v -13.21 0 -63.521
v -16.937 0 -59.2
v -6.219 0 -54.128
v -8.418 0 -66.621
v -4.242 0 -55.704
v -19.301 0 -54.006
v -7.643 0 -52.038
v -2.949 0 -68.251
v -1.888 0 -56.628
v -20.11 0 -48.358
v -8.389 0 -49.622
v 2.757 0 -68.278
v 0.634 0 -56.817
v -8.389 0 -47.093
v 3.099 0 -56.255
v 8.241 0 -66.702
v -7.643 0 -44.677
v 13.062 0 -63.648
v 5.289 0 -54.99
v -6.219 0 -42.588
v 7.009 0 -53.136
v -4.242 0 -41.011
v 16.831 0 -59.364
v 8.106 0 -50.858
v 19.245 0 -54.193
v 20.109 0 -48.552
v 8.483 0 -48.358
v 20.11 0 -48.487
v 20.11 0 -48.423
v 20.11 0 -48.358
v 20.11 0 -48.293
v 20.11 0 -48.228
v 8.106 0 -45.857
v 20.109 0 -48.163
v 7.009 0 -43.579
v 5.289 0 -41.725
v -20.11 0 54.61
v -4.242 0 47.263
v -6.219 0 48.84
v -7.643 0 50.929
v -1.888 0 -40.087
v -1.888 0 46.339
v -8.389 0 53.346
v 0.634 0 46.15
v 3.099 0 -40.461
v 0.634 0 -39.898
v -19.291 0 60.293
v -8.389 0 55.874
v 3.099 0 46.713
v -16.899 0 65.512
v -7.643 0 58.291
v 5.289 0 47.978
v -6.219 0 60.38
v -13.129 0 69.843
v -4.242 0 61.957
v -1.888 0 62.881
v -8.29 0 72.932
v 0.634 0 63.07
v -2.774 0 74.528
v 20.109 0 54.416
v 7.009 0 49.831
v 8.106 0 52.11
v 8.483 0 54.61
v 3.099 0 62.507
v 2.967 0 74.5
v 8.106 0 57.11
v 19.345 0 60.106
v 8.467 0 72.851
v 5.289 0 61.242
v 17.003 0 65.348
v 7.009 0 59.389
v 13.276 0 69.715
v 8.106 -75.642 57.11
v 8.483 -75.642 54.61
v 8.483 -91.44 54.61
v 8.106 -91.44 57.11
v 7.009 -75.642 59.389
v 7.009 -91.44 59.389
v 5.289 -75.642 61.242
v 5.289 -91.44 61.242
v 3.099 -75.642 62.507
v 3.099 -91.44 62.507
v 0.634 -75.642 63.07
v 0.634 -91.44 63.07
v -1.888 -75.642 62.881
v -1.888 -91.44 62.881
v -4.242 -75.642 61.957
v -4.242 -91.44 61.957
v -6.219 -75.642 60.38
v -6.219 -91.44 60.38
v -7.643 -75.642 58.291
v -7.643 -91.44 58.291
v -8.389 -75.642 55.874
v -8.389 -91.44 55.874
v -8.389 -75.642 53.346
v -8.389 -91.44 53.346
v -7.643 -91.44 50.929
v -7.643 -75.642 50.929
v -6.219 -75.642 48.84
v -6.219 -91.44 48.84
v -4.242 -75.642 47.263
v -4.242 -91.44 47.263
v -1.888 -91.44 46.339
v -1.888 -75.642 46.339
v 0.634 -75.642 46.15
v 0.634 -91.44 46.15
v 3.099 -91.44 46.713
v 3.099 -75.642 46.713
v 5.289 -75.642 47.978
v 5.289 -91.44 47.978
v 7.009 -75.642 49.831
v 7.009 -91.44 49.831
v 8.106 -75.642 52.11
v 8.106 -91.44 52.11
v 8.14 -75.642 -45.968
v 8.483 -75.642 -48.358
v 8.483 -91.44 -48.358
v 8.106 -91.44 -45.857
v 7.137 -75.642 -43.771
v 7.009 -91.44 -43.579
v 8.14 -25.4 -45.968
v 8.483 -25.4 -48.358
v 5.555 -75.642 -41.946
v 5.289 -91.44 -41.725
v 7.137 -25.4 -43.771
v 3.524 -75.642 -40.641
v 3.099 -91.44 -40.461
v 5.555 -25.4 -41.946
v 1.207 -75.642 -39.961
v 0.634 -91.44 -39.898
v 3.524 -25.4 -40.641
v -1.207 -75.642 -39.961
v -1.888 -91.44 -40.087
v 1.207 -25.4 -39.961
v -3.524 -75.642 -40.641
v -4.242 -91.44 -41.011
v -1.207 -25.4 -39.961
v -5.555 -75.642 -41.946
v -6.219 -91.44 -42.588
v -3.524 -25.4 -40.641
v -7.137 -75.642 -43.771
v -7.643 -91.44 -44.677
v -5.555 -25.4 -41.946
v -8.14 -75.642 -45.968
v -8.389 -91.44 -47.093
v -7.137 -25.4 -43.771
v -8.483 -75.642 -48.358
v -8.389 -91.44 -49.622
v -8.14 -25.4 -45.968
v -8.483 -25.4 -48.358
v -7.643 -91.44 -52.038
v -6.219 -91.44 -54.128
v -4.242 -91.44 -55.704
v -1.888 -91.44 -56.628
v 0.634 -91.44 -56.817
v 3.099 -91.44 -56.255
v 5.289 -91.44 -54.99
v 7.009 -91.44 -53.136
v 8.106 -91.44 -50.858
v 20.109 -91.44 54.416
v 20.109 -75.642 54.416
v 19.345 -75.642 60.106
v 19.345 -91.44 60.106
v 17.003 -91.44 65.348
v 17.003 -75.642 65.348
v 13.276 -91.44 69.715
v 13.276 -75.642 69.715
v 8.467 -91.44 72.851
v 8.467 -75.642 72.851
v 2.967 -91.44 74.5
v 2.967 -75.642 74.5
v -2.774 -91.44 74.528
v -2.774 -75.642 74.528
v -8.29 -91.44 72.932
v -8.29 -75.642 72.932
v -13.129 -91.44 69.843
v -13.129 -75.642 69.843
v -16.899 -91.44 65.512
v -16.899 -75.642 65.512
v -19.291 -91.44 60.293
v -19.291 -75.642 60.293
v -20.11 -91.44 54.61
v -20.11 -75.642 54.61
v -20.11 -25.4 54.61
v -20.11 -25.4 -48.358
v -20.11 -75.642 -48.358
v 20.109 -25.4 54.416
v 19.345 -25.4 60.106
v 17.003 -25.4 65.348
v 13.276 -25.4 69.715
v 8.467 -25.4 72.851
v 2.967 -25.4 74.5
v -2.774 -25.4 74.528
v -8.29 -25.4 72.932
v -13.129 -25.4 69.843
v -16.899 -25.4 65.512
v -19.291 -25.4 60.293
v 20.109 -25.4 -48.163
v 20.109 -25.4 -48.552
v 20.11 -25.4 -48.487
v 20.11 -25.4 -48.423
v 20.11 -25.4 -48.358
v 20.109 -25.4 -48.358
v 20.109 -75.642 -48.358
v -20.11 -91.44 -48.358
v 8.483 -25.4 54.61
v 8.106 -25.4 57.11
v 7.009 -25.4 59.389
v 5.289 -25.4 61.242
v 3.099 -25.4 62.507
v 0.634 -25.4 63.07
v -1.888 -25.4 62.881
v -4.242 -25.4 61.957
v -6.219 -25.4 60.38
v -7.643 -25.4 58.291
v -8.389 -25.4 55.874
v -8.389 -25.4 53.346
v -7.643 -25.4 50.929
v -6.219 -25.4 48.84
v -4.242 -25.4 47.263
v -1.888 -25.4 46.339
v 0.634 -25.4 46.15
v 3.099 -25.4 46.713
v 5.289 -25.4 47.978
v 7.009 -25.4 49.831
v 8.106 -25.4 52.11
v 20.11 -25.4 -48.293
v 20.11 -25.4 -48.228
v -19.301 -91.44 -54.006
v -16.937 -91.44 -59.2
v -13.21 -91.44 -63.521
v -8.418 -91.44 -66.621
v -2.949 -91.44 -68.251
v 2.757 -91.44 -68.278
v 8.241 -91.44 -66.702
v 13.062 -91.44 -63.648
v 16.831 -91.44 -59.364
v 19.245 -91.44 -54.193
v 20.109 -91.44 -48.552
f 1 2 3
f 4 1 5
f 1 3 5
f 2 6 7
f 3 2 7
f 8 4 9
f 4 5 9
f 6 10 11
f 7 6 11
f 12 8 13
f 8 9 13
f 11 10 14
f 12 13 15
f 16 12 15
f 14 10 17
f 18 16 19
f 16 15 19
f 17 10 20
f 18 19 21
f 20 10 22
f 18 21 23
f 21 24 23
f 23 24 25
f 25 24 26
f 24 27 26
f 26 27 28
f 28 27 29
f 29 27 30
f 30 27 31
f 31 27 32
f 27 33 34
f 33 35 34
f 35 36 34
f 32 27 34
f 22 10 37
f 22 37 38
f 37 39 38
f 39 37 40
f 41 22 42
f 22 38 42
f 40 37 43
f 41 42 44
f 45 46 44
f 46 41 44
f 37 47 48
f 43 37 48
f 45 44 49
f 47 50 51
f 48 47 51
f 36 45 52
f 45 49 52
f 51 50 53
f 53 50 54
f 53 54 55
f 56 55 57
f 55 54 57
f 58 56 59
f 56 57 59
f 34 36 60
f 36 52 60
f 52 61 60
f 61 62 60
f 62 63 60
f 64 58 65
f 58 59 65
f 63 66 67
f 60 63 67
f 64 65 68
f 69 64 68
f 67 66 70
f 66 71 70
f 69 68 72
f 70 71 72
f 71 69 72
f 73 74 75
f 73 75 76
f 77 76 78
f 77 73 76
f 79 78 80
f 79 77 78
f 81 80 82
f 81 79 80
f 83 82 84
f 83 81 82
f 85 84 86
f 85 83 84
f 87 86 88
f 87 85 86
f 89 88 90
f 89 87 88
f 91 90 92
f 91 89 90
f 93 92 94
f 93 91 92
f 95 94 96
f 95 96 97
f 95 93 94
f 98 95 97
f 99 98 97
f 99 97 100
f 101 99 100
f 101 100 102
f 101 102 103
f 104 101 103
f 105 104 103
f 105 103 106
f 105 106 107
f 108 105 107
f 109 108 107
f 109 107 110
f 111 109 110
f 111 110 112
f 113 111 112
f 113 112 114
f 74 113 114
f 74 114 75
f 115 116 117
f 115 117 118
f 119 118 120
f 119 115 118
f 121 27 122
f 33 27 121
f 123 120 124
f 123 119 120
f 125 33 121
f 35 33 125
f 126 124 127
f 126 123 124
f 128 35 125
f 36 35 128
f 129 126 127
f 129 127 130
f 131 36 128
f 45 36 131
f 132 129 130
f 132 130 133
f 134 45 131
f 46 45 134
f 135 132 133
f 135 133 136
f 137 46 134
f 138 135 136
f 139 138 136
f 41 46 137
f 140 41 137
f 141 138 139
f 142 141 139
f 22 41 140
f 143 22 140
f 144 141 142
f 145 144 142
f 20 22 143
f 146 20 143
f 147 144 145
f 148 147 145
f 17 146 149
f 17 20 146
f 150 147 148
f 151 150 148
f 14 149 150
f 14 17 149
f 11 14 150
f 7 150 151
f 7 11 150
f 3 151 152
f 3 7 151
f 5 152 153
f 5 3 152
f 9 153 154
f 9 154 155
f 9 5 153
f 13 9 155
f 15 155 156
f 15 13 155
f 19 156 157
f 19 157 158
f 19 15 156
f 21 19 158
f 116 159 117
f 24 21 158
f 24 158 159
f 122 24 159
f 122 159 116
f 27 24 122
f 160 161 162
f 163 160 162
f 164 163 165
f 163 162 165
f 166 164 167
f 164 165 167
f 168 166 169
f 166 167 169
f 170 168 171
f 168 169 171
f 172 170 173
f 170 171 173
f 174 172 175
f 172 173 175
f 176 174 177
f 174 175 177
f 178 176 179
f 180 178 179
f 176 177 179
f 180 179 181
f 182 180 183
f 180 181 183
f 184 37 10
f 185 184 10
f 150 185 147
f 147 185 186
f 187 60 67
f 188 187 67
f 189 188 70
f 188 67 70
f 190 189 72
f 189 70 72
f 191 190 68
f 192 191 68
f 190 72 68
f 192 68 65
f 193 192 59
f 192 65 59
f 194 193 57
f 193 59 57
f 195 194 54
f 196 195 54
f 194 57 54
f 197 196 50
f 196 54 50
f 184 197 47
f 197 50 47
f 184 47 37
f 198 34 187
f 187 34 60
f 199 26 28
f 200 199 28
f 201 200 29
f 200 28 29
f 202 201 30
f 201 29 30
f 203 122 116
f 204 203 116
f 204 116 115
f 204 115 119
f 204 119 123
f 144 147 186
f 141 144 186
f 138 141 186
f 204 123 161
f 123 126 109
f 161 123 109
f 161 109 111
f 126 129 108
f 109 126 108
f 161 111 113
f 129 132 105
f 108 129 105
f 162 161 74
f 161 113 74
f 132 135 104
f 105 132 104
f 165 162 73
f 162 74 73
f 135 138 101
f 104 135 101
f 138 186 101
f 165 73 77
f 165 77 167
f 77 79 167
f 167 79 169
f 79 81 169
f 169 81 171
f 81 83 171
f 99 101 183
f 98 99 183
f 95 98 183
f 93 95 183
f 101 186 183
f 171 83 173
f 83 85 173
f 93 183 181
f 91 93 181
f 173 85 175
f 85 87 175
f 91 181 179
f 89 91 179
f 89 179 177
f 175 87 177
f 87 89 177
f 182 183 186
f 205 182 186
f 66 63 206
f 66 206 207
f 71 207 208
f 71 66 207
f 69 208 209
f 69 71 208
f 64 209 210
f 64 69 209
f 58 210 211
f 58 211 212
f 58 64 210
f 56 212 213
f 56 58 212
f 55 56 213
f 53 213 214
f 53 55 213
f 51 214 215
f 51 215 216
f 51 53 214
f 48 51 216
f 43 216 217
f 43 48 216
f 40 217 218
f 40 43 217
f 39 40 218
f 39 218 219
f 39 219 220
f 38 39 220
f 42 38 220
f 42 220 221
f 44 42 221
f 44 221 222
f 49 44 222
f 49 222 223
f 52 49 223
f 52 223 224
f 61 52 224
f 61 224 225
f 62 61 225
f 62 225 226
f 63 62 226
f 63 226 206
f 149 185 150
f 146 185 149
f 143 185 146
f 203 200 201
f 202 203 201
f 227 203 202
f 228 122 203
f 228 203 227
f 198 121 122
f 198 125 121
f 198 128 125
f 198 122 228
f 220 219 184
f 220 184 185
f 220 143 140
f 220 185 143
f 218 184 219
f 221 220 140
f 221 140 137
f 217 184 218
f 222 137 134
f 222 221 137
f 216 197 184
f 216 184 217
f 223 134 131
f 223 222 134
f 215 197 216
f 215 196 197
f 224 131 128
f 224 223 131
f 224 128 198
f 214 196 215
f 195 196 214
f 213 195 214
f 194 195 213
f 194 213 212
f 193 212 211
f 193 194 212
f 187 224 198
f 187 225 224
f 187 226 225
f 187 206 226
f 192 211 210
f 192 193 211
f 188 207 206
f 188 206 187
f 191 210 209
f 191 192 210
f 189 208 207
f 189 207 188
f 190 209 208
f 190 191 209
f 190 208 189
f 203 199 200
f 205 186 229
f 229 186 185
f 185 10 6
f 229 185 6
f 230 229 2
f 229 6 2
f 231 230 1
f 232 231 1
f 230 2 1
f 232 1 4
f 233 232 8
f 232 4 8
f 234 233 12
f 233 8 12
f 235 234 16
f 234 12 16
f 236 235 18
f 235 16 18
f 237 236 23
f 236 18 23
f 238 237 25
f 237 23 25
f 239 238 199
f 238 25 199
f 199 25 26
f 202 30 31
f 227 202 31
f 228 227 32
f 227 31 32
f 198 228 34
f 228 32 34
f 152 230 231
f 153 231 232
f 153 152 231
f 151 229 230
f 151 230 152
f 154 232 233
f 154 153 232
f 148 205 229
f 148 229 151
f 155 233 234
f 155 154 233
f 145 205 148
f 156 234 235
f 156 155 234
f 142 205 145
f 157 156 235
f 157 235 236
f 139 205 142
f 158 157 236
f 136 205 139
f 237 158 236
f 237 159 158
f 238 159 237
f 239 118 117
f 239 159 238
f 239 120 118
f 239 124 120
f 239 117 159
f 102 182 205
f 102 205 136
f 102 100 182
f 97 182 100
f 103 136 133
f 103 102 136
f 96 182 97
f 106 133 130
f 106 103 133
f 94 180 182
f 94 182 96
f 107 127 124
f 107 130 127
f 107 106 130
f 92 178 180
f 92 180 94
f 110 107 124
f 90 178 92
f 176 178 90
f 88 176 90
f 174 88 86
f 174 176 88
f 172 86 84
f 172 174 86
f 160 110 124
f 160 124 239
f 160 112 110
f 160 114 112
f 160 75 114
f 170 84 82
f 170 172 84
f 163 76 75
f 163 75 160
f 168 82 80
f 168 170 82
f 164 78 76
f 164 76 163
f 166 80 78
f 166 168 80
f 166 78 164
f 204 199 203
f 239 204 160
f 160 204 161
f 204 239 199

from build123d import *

# Parameters (mm, degrees)
F0_R     = 8.4832662773
F1_DEPTH = 91.44
F2_W     = 59.8430555439
F2_H     = 102.967698127
F3_DEPTH = 57.658
F4_DEPTH = 25.4


# Not quite as in the source:
# - the program builds the solid bodies; features that only make, move or delete a surface that nothing else refers to are left out


with BuildPart() as f1:
    # F0 (on Front) → F1 (new body)
    with BuildSketch(Plane.XZ):
        with BuildLine():
            Line((20.1094433592, -48.163229742), (20.1094433592, 54.4155371868))
            ThreePointArc((20.1094433592, 54.4155371868), (0.0972339361, 74.7201513345), (-20.1103836136, 54.6100027859))
            Line((-20.1103836136, 54.6100027859), (-20.1103836136, -48.3576953411))
            ThreePointArc((-20.1103836136, -48.3576953411), (-0.0972339361, -28.2475467925), (20.1094433592, -48.163229742))
        make_face()
        with Locations((0, 54.6100027859)):
            Circle(F0_R, mode=Mode.SUBTRACT)
        with BuildLine():
            Line((20.1094433592, -48.5521609402), (20.1094433592, -48.163229742))
            ThreePointArc((20.1094433592, -48.163229742), (-0.0972339361, -28.2475467925), (-20.1103836136, -48.3576953411))
            ThreePointArc((-20.1103836136, -48.3576953411), (-0.0972339361, -68.4678438897), (20.1094433592, -48.5521609402))
        make_face()
        with Locations((0, -48.3576953411)):
            Circle(F0_R, mode=Mode.SUBTRACT)
    extrude(amount=F1_DEPTH)

    # F2 (on face) → F3 (cut)
    with BuildSketch(Plane(origin=(-20.1103836136, 0, 0), x_dir=(0, -1, 0), z_dir=(-1, 0, 0))):
        with Locations((45.72, 106.0938518494)):
            Rectangle(F2_W, F2_H)
        with Locations((45.72, 3.1261537224)):
            Rectangle(F2_W, F2_H)
    extrude(amount=-F3_DEPTH, mode=Mode.SUBTRACT)

    # F0 (on Front) → F4 (join)
    with BuildSketch(Plane.XZ):
        with BuildLine():
            Line((20.1094433592, -48.163229742), (20.1094433592, 54.4155371868))
            ThreePointArc((20.1094433592, 54.4155371868), (0.0972339361, 74.7201513345), (-20.1103836136, 54.6100027859))
            Line((-20.1103836136, 54.6100027859), (-20.1103836136, -48.3576953411))
            ThreePointArc((-20.1103836136, -48.3576953411), (-0.0972339361, -28.2475467925), (20.1094433592, -48.163229742))
        make_face()
        with Locations((0, 54.6100027859)):
            Circle(F0_R, mode=Mode.SUBTRACT)
        with BuildLine():
            Line((20.1094433592, -48.5521609402), (20.1094433592, -48.163229742))
            ThreePointArc((20.1094433592, -48.163229742), (-0.0972339361, -28.2475467925), (-20.1103836136, -48.3576953411))
            ThreePointArc((-20.1103836136, -48.3576953411), (-0.0972339361, -68.4678438897), (20.1094433592, -48.5521609402))
        make_face()
        with Locations((0, -48.3576953411)):
            Circle(F0_R, mode=Mode.SUBTRACT)
        with BuildLine():
            ThreePointArc((20.1103836136, -48.3576953411), (20.1101485486, -48.260461405), (20.1094433592, -48.163229742))
            Line((20.1094433592, -48.163229742), (20.1094433592, -48.5521609402))
            ThreePointArc((20.1094433592, -48.5521609402), (20.1101485486, -48.4549292772), (20.1103836136, -48.3576953411))
        make_face()
    extrude(amount=F4_DEPTH)


solid = f1.part
